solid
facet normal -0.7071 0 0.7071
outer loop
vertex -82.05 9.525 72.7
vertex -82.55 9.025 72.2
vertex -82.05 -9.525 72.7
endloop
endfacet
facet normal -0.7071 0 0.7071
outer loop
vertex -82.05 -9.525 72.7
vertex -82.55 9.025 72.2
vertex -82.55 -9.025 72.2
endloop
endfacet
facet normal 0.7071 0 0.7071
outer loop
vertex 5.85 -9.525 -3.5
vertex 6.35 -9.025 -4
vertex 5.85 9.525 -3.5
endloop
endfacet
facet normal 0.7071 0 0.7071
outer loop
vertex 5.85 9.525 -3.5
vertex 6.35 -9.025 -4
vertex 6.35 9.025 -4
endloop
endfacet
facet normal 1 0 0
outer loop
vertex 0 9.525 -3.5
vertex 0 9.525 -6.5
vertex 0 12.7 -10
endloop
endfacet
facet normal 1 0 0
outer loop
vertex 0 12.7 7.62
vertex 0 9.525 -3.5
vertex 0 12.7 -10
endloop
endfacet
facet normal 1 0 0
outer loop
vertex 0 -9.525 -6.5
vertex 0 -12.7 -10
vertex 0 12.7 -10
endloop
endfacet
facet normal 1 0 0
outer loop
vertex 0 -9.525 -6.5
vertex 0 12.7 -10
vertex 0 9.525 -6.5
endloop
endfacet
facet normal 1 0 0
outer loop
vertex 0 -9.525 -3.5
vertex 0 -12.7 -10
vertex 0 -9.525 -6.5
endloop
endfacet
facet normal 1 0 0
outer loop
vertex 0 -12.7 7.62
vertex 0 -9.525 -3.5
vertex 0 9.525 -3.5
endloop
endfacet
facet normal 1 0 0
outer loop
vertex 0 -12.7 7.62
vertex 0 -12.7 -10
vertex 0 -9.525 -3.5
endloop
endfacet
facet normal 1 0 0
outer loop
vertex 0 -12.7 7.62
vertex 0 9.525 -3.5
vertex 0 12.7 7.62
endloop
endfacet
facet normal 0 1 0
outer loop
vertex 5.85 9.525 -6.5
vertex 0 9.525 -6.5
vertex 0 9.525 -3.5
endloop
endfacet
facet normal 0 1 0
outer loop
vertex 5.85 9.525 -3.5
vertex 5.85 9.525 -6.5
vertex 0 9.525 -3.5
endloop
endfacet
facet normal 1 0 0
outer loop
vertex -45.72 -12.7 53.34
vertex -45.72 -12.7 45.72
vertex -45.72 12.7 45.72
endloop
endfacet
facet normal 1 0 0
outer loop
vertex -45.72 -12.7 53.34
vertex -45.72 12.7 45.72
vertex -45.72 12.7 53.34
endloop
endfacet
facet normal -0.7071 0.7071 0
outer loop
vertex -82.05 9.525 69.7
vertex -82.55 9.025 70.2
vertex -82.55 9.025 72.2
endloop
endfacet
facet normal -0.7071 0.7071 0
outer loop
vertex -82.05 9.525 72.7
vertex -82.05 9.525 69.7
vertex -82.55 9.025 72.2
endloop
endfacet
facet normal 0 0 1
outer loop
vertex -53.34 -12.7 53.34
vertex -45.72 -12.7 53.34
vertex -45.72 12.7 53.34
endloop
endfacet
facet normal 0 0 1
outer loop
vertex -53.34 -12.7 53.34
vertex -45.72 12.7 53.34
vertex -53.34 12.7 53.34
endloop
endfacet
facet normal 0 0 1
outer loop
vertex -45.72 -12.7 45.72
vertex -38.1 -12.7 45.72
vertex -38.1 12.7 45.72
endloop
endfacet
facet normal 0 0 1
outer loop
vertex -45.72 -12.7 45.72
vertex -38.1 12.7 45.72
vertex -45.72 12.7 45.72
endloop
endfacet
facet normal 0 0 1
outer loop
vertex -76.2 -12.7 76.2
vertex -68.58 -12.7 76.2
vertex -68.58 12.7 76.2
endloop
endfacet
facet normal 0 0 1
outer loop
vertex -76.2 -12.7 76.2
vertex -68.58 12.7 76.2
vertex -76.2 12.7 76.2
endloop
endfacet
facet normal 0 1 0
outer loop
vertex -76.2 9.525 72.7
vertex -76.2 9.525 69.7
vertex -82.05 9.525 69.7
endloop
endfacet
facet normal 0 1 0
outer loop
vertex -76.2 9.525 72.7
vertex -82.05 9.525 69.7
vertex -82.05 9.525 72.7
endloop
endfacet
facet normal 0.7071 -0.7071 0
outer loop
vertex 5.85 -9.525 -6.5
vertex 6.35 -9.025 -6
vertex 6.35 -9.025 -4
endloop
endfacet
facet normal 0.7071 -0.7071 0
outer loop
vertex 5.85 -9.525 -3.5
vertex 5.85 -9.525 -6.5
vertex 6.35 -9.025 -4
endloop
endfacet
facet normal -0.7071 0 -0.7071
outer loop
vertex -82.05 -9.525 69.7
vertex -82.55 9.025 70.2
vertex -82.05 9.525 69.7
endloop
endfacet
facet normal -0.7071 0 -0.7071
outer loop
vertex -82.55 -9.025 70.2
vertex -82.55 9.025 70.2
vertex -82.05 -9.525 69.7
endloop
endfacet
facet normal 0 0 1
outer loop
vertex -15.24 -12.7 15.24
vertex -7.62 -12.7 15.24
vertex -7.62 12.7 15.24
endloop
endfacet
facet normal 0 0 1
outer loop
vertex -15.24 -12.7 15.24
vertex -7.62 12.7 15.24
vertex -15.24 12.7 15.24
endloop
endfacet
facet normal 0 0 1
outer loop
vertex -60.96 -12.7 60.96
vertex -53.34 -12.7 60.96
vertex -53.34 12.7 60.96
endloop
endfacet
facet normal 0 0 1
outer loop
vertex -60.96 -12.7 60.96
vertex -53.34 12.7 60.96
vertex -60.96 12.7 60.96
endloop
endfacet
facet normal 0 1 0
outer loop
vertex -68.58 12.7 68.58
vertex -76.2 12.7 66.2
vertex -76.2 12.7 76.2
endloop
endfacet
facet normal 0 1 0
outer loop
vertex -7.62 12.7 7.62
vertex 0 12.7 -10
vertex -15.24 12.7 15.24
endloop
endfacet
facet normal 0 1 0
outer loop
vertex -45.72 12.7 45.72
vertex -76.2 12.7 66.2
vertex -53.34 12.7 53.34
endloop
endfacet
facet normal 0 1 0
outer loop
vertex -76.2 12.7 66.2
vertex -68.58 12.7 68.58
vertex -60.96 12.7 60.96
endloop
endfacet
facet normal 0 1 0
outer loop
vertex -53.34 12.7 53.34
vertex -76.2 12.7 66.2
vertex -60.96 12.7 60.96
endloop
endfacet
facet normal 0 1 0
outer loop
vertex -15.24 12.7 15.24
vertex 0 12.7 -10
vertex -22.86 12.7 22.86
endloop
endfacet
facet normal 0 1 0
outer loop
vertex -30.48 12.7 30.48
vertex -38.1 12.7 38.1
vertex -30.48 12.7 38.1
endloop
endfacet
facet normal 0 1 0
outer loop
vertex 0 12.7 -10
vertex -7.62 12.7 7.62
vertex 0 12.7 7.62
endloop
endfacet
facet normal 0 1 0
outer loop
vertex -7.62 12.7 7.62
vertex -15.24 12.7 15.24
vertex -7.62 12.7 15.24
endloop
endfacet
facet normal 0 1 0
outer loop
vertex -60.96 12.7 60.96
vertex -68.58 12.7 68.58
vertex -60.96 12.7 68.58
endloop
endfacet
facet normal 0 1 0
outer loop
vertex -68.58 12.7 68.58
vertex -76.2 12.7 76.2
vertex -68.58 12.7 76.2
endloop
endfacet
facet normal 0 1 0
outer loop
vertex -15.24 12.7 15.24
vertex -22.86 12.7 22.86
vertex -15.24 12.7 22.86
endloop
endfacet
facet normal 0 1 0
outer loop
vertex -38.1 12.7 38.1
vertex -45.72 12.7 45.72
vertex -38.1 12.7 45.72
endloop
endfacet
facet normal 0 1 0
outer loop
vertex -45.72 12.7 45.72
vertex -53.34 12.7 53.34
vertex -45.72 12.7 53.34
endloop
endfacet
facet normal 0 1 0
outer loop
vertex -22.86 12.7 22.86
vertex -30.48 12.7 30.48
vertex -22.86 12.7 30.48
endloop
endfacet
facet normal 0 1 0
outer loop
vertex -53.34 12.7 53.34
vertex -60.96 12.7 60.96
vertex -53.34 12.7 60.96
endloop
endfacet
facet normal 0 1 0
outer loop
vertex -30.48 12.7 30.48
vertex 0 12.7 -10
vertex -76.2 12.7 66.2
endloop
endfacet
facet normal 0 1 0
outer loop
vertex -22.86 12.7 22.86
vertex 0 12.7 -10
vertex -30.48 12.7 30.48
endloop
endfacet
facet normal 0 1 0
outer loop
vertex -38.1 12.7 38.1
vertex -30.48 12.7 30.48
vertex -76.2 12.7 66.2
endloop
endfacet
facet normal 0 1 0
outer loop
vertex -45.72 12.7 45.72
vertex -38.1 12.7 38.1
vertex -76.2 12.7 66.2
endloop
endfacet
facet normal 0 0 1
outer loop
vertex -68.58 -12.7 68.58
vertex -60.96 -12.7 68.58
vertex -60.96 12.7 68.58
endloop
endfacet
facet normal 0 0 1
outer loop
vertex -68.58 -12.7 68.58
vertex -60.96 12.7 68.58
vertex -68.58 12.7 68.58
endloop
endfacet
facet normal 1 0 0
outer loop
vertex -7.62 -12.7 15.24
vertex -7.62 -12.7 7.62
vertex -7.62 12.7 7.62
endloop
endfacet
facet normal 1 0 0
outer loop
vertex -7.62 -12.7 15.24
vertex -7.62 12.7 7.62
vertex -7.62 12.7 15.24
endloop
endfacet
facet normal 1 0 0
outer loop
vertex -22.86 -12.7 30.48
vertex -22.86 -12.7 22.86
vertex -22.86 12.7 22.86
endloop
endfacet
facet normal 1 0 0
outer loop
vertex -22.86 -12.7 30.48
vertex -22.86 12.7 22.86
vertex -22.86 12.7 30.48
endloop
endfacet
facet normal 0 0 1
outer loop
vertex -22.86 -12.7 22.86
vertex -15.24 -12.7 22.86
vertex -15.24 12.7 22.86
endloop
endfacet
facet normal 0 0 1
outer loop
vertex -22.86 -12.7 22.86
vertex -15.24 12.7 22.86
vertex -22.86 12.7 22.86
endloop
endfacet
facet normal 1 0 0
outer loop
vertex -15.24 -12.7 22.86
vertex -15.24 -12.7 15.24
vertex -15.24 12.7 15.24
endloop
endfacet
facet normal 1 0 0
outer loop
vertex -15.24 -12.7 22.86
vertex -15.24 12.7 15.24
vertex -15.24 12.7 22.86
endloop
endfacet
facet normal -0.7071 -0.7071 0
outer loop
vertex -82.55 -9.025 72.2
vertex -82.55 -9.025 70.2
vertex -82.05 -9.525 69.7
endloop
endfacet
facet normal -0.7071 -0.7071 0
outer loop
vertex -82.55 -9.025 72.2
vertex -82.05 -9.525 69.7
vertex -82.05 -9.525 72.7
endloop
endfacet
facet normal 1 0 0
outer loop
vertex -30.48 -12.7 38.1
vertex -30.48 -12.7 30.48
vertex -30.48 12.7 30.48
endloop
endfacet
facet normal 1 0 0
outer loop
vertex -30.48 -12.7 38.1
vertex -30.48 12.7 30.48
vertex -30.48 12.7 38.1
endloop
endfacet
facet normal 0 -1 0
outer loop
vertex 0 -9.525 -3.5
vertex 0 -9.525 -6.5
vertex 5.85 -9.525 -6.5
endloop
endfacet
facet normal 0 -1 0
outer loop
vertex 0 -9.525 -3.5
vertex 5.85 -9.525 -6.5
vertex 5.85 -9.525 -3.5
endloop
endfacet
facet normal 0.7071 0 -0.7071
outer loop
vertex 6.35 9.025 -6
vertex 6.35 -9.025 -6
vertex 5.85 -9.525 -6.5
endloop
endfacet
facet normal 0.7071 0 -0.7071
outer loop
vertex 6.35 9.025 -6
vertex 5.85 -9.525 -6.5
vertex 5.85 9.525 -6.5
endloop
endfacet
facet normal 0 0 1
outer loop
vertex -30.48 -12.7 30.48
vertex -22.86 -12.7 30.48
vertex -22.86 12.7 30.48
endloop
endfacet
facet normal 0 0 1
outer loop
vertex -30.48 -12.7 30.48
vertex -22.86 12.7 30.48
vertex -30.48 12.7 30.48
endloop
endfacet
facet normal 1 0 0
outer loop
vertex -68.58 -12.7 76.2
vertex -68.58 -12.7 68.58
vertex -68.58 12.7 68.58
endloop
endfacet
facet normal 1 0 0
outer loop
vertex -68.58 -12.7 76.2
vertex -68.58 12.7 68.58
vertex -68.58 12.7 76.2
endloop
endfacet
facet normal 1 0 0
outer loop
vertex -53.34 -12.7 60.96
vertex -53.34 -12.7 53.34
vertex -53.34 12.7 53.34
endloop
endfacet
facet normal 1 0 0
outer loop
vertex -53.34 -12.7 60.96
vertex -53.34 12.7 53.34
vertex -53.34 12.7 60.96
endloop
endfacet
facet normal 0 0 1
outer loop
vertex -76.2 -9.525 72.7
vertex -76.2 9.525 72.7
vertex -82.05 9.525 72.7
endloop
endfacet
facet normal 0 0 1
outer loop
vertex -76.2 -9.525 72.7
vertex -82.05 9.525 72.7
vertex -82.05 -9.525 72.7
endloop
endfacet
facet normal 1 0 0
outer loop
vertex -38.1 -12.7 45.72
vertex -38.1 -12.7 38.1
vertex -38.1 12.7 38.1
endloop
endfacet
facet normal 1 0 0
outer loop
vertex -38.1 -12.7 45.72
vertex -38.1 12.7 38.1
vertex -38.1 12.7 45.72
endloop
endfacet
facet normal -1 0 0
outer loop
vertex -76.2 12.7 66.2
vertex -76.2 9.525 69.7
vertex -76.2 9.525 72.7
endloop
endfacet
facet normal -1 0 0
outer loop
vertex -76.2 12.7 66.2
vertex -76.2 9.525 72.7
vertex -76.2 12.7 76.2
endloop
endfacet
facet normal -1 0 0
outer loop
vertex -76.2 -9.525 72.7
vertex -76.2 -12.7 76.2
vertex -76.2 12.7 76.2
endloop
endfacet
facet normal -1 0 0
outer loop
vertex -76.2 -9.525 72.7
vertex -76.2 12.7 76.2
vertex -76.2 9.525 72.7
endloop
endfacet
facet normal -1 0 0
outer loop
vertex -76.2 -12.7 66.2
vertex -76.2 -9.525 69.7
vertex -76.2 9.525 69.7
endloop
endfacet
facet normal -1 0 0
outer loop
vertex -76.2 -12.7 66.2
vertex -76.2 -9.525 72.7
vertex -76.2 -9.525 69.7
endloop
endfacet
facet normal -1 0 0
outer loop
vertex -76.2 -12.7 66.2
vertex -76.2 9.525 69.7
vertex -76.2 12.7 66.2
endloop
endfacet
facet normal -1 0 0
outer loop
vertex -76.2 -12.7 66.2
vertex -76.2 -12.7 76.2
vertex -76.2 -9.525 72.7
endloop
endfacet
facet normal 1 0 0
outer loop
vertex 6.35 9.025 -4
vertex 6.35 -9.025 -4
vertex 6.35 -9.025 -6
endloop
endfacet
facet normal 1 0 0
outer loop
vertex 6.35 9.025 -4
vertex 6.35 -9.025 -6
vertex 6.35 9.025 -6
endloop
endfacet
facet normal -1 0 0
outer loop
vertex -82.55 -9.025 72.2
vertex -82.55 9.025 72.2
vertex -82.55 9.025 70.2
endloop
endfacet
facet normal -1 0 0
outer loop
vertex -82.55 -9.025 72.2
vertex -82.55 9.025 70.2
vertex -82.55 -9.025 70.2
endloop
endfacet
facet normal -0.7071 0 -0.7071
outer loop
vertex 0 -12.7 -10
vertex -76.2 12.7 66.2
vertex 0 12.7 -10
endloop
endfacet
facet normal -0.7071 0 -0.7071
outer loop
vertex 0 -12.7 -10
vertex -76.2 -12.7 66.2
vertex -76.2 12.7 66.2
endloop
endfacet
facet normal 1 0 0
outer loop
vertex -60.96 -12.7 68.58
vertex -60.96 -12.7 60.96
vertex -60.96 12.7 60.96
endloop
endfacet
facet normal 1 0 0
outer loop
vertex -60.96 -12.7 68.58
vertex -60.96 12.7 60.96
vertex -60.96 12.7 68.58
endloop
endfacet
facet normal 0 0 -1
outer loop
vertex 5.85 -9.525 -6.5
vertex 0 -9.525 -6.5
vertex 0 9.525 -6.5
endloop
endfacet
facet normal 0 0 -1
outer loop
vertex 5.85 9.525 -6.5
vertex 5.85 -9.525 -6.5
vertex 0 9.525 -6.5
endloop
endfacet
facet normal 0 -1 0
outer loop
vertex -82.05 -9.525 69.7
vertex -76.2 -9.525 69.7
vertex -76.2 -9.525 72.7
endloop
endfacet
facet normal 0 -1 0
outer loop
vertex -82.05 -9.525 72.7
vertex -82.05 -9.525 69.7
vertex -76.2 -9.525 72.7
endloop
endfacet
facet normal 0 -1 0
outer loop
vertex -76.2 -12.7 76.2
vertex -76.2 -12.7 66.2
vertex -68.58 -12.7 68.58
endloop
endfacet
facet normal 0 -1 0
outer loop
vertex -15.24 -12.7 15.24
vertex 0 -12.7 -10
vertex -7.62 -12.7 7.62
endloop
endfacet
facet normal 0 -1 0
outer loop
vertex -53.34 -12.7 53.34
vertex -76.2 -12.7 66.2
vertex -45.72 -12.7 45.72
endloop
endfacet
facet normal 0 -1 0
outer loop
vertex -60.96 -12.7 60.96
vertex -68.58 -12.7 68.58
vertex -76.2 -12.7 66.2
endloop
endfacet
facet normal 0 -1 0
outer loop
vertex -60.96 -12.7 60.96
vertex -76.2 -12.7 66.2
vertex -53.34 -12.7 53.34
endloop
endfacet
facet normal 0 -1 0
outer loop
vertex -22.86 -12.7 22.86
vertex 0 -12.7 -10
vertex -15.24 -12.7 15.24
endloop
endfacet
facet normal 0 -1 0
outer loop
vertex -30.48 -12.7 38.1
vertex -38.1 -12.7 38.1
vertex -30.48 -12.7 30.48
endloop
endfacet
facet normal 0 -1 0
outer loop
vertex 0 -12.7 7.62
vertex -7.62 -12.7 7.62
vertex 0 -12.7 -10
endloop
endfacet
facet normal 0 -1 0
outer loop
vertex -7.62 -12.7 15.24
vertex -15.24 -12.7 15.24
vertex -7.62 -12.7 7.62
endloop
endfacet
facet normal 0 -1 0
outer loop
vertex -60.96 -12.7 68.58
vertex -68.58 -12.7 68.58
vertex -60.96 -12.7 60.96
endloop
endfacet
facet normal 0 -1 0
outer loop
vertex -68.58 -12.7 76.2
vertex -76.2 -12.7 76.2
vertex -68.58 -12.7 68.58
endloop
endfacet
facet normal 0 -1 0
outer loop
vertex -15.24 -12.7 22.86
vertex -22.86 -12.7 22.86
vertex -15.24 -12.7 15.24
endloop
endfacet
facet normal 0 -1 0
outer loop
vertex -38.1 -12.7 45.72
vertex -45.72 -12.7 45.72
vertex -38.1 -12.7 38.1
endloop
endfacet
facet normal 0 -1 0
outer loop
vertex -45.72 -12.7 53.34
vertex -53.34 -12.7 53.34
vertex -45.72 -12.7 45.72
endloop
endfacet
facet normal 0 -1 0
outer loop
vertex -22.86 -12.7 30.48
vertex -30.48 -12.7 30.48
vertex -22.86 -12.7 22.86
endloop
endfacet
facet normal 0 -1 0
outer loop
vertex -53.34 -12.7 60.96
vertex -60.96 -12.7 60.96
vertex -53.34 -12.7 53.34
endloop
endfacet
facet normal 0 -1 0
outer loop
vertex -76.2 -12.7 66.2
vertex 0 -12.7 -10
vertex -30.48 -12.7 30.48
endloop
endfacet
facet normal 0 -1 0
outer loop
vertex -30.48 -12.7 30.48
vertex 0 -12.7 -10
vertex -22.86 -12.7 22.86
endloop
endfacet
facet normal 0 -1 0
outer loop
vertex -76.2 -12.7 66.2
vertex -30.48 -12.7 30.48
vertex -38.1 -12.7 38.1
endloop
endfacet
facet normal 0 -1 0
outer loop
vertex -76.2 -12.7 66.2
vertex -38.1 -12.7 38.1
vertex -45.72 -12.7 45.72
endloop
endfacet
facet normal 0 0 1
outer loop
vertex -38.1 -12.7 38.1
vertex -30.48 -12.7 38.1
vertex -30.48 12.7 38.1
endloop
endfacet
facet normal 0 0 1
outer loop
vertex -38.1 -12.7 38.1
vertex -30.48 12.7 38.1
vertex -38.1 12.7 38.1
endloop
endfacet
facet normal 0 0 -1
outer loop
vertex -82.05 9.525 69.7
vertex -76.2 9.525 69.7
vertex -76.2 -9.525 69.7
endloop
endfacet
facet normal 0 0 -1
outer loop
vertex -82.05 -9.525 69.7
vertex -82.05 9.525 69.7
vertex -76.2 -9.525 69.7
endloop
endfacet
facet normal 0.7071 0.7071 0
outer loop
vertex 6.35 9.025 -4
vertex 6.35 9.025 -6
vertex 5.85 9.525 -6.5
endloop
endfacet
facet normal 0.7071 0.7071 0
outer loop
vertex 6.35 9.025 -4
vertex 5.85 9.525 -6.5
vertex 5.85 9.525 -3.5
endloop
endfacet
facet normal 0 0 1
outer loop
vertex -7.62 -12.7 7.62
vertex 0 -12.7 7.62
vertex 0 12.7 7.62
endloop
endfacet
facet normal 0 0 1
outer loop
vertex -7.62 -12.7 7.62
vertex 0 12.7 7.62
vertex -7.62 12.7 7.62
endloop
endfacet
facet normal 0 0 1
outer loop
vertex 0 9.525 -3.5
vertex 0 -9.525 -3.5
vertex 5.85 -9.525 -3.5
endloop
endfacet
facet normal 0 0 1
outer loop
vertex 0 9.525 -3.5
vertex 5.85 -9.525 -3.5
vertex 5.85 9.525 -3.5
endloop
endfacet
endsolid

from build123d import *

# Parameters (mm, degrees)
F1_DEPTH = 12.7
F2_W     = 19.05
F2_H     = 3
F3_DEPTH = 6.35
F4_W     = 19.05
F4_H     = 3
F5_DEPTH = 6.35
F6_SIZE  = 0.5


with BuildPart() as f1:
    # F0 (on Front) → F1 (new body, symmetric)
    with BuildSketch(Plane.XZ):
        Polygon((0, -10), (0, 0), (0, 7.62), (-7.62, 7.62), (-7.62, 15.24), (-15.24, 15.24), (-15.24, 22.86), (-22.86, 22.86), (-22.86, 30.48), (-30.48, 30.48), (-30.48, 38.1), (-38.1, 38.1), (-38.1, 45.72), (-45.72, 45.72), (-45.72, 53.34), (-53.34, 53.34), (-53.34, 60.96), (-60.96, 60.96), (-60.96, 68.58), (-68.58, 68.58), (-68.58, 76.2), (-76.2, 76.2), (-76.2, 66.2), align=None)
    extrude(amount=F1_DEPTH, both=True)

    # F2 (on face) → F3 (join)
    with BuildSketch(Plane.YZ):
        with Locations((0, -5)):
            Rectangle(F2_W, F2_H)
    extrude(amount=F3_DEPTH)

    # F4 (on face) → F5 (join)
    with BuildSketch(Plane(origin=(-76.2, 0, 0), x_dir=(0, -1, 0), z_dir=(-1, 0, 0))):
        with Locations((0, 71.2)):
            Rectangle(F4_W, F4_H)
    extrude(amount=F5_DEPTH)

    # F6
    f6_edges = [f1.edges().sort_by_distance(p)[0] for p in [
        (-82.55, 0, 72.7),
        (-82.55, 9.525, 71.2),
        (-82.55, 0, 69.7),
        (-82.55, -9.525, 71.2),
        (6.35, 9.525, -5),
        (6.35, 0, -3.5),
        (6.35, -9.525, -5),
        (6.35, 0, -6.5),
    ]]
    chamfer(f6_edges, length=F6_SIZE)


solid = f1.part
